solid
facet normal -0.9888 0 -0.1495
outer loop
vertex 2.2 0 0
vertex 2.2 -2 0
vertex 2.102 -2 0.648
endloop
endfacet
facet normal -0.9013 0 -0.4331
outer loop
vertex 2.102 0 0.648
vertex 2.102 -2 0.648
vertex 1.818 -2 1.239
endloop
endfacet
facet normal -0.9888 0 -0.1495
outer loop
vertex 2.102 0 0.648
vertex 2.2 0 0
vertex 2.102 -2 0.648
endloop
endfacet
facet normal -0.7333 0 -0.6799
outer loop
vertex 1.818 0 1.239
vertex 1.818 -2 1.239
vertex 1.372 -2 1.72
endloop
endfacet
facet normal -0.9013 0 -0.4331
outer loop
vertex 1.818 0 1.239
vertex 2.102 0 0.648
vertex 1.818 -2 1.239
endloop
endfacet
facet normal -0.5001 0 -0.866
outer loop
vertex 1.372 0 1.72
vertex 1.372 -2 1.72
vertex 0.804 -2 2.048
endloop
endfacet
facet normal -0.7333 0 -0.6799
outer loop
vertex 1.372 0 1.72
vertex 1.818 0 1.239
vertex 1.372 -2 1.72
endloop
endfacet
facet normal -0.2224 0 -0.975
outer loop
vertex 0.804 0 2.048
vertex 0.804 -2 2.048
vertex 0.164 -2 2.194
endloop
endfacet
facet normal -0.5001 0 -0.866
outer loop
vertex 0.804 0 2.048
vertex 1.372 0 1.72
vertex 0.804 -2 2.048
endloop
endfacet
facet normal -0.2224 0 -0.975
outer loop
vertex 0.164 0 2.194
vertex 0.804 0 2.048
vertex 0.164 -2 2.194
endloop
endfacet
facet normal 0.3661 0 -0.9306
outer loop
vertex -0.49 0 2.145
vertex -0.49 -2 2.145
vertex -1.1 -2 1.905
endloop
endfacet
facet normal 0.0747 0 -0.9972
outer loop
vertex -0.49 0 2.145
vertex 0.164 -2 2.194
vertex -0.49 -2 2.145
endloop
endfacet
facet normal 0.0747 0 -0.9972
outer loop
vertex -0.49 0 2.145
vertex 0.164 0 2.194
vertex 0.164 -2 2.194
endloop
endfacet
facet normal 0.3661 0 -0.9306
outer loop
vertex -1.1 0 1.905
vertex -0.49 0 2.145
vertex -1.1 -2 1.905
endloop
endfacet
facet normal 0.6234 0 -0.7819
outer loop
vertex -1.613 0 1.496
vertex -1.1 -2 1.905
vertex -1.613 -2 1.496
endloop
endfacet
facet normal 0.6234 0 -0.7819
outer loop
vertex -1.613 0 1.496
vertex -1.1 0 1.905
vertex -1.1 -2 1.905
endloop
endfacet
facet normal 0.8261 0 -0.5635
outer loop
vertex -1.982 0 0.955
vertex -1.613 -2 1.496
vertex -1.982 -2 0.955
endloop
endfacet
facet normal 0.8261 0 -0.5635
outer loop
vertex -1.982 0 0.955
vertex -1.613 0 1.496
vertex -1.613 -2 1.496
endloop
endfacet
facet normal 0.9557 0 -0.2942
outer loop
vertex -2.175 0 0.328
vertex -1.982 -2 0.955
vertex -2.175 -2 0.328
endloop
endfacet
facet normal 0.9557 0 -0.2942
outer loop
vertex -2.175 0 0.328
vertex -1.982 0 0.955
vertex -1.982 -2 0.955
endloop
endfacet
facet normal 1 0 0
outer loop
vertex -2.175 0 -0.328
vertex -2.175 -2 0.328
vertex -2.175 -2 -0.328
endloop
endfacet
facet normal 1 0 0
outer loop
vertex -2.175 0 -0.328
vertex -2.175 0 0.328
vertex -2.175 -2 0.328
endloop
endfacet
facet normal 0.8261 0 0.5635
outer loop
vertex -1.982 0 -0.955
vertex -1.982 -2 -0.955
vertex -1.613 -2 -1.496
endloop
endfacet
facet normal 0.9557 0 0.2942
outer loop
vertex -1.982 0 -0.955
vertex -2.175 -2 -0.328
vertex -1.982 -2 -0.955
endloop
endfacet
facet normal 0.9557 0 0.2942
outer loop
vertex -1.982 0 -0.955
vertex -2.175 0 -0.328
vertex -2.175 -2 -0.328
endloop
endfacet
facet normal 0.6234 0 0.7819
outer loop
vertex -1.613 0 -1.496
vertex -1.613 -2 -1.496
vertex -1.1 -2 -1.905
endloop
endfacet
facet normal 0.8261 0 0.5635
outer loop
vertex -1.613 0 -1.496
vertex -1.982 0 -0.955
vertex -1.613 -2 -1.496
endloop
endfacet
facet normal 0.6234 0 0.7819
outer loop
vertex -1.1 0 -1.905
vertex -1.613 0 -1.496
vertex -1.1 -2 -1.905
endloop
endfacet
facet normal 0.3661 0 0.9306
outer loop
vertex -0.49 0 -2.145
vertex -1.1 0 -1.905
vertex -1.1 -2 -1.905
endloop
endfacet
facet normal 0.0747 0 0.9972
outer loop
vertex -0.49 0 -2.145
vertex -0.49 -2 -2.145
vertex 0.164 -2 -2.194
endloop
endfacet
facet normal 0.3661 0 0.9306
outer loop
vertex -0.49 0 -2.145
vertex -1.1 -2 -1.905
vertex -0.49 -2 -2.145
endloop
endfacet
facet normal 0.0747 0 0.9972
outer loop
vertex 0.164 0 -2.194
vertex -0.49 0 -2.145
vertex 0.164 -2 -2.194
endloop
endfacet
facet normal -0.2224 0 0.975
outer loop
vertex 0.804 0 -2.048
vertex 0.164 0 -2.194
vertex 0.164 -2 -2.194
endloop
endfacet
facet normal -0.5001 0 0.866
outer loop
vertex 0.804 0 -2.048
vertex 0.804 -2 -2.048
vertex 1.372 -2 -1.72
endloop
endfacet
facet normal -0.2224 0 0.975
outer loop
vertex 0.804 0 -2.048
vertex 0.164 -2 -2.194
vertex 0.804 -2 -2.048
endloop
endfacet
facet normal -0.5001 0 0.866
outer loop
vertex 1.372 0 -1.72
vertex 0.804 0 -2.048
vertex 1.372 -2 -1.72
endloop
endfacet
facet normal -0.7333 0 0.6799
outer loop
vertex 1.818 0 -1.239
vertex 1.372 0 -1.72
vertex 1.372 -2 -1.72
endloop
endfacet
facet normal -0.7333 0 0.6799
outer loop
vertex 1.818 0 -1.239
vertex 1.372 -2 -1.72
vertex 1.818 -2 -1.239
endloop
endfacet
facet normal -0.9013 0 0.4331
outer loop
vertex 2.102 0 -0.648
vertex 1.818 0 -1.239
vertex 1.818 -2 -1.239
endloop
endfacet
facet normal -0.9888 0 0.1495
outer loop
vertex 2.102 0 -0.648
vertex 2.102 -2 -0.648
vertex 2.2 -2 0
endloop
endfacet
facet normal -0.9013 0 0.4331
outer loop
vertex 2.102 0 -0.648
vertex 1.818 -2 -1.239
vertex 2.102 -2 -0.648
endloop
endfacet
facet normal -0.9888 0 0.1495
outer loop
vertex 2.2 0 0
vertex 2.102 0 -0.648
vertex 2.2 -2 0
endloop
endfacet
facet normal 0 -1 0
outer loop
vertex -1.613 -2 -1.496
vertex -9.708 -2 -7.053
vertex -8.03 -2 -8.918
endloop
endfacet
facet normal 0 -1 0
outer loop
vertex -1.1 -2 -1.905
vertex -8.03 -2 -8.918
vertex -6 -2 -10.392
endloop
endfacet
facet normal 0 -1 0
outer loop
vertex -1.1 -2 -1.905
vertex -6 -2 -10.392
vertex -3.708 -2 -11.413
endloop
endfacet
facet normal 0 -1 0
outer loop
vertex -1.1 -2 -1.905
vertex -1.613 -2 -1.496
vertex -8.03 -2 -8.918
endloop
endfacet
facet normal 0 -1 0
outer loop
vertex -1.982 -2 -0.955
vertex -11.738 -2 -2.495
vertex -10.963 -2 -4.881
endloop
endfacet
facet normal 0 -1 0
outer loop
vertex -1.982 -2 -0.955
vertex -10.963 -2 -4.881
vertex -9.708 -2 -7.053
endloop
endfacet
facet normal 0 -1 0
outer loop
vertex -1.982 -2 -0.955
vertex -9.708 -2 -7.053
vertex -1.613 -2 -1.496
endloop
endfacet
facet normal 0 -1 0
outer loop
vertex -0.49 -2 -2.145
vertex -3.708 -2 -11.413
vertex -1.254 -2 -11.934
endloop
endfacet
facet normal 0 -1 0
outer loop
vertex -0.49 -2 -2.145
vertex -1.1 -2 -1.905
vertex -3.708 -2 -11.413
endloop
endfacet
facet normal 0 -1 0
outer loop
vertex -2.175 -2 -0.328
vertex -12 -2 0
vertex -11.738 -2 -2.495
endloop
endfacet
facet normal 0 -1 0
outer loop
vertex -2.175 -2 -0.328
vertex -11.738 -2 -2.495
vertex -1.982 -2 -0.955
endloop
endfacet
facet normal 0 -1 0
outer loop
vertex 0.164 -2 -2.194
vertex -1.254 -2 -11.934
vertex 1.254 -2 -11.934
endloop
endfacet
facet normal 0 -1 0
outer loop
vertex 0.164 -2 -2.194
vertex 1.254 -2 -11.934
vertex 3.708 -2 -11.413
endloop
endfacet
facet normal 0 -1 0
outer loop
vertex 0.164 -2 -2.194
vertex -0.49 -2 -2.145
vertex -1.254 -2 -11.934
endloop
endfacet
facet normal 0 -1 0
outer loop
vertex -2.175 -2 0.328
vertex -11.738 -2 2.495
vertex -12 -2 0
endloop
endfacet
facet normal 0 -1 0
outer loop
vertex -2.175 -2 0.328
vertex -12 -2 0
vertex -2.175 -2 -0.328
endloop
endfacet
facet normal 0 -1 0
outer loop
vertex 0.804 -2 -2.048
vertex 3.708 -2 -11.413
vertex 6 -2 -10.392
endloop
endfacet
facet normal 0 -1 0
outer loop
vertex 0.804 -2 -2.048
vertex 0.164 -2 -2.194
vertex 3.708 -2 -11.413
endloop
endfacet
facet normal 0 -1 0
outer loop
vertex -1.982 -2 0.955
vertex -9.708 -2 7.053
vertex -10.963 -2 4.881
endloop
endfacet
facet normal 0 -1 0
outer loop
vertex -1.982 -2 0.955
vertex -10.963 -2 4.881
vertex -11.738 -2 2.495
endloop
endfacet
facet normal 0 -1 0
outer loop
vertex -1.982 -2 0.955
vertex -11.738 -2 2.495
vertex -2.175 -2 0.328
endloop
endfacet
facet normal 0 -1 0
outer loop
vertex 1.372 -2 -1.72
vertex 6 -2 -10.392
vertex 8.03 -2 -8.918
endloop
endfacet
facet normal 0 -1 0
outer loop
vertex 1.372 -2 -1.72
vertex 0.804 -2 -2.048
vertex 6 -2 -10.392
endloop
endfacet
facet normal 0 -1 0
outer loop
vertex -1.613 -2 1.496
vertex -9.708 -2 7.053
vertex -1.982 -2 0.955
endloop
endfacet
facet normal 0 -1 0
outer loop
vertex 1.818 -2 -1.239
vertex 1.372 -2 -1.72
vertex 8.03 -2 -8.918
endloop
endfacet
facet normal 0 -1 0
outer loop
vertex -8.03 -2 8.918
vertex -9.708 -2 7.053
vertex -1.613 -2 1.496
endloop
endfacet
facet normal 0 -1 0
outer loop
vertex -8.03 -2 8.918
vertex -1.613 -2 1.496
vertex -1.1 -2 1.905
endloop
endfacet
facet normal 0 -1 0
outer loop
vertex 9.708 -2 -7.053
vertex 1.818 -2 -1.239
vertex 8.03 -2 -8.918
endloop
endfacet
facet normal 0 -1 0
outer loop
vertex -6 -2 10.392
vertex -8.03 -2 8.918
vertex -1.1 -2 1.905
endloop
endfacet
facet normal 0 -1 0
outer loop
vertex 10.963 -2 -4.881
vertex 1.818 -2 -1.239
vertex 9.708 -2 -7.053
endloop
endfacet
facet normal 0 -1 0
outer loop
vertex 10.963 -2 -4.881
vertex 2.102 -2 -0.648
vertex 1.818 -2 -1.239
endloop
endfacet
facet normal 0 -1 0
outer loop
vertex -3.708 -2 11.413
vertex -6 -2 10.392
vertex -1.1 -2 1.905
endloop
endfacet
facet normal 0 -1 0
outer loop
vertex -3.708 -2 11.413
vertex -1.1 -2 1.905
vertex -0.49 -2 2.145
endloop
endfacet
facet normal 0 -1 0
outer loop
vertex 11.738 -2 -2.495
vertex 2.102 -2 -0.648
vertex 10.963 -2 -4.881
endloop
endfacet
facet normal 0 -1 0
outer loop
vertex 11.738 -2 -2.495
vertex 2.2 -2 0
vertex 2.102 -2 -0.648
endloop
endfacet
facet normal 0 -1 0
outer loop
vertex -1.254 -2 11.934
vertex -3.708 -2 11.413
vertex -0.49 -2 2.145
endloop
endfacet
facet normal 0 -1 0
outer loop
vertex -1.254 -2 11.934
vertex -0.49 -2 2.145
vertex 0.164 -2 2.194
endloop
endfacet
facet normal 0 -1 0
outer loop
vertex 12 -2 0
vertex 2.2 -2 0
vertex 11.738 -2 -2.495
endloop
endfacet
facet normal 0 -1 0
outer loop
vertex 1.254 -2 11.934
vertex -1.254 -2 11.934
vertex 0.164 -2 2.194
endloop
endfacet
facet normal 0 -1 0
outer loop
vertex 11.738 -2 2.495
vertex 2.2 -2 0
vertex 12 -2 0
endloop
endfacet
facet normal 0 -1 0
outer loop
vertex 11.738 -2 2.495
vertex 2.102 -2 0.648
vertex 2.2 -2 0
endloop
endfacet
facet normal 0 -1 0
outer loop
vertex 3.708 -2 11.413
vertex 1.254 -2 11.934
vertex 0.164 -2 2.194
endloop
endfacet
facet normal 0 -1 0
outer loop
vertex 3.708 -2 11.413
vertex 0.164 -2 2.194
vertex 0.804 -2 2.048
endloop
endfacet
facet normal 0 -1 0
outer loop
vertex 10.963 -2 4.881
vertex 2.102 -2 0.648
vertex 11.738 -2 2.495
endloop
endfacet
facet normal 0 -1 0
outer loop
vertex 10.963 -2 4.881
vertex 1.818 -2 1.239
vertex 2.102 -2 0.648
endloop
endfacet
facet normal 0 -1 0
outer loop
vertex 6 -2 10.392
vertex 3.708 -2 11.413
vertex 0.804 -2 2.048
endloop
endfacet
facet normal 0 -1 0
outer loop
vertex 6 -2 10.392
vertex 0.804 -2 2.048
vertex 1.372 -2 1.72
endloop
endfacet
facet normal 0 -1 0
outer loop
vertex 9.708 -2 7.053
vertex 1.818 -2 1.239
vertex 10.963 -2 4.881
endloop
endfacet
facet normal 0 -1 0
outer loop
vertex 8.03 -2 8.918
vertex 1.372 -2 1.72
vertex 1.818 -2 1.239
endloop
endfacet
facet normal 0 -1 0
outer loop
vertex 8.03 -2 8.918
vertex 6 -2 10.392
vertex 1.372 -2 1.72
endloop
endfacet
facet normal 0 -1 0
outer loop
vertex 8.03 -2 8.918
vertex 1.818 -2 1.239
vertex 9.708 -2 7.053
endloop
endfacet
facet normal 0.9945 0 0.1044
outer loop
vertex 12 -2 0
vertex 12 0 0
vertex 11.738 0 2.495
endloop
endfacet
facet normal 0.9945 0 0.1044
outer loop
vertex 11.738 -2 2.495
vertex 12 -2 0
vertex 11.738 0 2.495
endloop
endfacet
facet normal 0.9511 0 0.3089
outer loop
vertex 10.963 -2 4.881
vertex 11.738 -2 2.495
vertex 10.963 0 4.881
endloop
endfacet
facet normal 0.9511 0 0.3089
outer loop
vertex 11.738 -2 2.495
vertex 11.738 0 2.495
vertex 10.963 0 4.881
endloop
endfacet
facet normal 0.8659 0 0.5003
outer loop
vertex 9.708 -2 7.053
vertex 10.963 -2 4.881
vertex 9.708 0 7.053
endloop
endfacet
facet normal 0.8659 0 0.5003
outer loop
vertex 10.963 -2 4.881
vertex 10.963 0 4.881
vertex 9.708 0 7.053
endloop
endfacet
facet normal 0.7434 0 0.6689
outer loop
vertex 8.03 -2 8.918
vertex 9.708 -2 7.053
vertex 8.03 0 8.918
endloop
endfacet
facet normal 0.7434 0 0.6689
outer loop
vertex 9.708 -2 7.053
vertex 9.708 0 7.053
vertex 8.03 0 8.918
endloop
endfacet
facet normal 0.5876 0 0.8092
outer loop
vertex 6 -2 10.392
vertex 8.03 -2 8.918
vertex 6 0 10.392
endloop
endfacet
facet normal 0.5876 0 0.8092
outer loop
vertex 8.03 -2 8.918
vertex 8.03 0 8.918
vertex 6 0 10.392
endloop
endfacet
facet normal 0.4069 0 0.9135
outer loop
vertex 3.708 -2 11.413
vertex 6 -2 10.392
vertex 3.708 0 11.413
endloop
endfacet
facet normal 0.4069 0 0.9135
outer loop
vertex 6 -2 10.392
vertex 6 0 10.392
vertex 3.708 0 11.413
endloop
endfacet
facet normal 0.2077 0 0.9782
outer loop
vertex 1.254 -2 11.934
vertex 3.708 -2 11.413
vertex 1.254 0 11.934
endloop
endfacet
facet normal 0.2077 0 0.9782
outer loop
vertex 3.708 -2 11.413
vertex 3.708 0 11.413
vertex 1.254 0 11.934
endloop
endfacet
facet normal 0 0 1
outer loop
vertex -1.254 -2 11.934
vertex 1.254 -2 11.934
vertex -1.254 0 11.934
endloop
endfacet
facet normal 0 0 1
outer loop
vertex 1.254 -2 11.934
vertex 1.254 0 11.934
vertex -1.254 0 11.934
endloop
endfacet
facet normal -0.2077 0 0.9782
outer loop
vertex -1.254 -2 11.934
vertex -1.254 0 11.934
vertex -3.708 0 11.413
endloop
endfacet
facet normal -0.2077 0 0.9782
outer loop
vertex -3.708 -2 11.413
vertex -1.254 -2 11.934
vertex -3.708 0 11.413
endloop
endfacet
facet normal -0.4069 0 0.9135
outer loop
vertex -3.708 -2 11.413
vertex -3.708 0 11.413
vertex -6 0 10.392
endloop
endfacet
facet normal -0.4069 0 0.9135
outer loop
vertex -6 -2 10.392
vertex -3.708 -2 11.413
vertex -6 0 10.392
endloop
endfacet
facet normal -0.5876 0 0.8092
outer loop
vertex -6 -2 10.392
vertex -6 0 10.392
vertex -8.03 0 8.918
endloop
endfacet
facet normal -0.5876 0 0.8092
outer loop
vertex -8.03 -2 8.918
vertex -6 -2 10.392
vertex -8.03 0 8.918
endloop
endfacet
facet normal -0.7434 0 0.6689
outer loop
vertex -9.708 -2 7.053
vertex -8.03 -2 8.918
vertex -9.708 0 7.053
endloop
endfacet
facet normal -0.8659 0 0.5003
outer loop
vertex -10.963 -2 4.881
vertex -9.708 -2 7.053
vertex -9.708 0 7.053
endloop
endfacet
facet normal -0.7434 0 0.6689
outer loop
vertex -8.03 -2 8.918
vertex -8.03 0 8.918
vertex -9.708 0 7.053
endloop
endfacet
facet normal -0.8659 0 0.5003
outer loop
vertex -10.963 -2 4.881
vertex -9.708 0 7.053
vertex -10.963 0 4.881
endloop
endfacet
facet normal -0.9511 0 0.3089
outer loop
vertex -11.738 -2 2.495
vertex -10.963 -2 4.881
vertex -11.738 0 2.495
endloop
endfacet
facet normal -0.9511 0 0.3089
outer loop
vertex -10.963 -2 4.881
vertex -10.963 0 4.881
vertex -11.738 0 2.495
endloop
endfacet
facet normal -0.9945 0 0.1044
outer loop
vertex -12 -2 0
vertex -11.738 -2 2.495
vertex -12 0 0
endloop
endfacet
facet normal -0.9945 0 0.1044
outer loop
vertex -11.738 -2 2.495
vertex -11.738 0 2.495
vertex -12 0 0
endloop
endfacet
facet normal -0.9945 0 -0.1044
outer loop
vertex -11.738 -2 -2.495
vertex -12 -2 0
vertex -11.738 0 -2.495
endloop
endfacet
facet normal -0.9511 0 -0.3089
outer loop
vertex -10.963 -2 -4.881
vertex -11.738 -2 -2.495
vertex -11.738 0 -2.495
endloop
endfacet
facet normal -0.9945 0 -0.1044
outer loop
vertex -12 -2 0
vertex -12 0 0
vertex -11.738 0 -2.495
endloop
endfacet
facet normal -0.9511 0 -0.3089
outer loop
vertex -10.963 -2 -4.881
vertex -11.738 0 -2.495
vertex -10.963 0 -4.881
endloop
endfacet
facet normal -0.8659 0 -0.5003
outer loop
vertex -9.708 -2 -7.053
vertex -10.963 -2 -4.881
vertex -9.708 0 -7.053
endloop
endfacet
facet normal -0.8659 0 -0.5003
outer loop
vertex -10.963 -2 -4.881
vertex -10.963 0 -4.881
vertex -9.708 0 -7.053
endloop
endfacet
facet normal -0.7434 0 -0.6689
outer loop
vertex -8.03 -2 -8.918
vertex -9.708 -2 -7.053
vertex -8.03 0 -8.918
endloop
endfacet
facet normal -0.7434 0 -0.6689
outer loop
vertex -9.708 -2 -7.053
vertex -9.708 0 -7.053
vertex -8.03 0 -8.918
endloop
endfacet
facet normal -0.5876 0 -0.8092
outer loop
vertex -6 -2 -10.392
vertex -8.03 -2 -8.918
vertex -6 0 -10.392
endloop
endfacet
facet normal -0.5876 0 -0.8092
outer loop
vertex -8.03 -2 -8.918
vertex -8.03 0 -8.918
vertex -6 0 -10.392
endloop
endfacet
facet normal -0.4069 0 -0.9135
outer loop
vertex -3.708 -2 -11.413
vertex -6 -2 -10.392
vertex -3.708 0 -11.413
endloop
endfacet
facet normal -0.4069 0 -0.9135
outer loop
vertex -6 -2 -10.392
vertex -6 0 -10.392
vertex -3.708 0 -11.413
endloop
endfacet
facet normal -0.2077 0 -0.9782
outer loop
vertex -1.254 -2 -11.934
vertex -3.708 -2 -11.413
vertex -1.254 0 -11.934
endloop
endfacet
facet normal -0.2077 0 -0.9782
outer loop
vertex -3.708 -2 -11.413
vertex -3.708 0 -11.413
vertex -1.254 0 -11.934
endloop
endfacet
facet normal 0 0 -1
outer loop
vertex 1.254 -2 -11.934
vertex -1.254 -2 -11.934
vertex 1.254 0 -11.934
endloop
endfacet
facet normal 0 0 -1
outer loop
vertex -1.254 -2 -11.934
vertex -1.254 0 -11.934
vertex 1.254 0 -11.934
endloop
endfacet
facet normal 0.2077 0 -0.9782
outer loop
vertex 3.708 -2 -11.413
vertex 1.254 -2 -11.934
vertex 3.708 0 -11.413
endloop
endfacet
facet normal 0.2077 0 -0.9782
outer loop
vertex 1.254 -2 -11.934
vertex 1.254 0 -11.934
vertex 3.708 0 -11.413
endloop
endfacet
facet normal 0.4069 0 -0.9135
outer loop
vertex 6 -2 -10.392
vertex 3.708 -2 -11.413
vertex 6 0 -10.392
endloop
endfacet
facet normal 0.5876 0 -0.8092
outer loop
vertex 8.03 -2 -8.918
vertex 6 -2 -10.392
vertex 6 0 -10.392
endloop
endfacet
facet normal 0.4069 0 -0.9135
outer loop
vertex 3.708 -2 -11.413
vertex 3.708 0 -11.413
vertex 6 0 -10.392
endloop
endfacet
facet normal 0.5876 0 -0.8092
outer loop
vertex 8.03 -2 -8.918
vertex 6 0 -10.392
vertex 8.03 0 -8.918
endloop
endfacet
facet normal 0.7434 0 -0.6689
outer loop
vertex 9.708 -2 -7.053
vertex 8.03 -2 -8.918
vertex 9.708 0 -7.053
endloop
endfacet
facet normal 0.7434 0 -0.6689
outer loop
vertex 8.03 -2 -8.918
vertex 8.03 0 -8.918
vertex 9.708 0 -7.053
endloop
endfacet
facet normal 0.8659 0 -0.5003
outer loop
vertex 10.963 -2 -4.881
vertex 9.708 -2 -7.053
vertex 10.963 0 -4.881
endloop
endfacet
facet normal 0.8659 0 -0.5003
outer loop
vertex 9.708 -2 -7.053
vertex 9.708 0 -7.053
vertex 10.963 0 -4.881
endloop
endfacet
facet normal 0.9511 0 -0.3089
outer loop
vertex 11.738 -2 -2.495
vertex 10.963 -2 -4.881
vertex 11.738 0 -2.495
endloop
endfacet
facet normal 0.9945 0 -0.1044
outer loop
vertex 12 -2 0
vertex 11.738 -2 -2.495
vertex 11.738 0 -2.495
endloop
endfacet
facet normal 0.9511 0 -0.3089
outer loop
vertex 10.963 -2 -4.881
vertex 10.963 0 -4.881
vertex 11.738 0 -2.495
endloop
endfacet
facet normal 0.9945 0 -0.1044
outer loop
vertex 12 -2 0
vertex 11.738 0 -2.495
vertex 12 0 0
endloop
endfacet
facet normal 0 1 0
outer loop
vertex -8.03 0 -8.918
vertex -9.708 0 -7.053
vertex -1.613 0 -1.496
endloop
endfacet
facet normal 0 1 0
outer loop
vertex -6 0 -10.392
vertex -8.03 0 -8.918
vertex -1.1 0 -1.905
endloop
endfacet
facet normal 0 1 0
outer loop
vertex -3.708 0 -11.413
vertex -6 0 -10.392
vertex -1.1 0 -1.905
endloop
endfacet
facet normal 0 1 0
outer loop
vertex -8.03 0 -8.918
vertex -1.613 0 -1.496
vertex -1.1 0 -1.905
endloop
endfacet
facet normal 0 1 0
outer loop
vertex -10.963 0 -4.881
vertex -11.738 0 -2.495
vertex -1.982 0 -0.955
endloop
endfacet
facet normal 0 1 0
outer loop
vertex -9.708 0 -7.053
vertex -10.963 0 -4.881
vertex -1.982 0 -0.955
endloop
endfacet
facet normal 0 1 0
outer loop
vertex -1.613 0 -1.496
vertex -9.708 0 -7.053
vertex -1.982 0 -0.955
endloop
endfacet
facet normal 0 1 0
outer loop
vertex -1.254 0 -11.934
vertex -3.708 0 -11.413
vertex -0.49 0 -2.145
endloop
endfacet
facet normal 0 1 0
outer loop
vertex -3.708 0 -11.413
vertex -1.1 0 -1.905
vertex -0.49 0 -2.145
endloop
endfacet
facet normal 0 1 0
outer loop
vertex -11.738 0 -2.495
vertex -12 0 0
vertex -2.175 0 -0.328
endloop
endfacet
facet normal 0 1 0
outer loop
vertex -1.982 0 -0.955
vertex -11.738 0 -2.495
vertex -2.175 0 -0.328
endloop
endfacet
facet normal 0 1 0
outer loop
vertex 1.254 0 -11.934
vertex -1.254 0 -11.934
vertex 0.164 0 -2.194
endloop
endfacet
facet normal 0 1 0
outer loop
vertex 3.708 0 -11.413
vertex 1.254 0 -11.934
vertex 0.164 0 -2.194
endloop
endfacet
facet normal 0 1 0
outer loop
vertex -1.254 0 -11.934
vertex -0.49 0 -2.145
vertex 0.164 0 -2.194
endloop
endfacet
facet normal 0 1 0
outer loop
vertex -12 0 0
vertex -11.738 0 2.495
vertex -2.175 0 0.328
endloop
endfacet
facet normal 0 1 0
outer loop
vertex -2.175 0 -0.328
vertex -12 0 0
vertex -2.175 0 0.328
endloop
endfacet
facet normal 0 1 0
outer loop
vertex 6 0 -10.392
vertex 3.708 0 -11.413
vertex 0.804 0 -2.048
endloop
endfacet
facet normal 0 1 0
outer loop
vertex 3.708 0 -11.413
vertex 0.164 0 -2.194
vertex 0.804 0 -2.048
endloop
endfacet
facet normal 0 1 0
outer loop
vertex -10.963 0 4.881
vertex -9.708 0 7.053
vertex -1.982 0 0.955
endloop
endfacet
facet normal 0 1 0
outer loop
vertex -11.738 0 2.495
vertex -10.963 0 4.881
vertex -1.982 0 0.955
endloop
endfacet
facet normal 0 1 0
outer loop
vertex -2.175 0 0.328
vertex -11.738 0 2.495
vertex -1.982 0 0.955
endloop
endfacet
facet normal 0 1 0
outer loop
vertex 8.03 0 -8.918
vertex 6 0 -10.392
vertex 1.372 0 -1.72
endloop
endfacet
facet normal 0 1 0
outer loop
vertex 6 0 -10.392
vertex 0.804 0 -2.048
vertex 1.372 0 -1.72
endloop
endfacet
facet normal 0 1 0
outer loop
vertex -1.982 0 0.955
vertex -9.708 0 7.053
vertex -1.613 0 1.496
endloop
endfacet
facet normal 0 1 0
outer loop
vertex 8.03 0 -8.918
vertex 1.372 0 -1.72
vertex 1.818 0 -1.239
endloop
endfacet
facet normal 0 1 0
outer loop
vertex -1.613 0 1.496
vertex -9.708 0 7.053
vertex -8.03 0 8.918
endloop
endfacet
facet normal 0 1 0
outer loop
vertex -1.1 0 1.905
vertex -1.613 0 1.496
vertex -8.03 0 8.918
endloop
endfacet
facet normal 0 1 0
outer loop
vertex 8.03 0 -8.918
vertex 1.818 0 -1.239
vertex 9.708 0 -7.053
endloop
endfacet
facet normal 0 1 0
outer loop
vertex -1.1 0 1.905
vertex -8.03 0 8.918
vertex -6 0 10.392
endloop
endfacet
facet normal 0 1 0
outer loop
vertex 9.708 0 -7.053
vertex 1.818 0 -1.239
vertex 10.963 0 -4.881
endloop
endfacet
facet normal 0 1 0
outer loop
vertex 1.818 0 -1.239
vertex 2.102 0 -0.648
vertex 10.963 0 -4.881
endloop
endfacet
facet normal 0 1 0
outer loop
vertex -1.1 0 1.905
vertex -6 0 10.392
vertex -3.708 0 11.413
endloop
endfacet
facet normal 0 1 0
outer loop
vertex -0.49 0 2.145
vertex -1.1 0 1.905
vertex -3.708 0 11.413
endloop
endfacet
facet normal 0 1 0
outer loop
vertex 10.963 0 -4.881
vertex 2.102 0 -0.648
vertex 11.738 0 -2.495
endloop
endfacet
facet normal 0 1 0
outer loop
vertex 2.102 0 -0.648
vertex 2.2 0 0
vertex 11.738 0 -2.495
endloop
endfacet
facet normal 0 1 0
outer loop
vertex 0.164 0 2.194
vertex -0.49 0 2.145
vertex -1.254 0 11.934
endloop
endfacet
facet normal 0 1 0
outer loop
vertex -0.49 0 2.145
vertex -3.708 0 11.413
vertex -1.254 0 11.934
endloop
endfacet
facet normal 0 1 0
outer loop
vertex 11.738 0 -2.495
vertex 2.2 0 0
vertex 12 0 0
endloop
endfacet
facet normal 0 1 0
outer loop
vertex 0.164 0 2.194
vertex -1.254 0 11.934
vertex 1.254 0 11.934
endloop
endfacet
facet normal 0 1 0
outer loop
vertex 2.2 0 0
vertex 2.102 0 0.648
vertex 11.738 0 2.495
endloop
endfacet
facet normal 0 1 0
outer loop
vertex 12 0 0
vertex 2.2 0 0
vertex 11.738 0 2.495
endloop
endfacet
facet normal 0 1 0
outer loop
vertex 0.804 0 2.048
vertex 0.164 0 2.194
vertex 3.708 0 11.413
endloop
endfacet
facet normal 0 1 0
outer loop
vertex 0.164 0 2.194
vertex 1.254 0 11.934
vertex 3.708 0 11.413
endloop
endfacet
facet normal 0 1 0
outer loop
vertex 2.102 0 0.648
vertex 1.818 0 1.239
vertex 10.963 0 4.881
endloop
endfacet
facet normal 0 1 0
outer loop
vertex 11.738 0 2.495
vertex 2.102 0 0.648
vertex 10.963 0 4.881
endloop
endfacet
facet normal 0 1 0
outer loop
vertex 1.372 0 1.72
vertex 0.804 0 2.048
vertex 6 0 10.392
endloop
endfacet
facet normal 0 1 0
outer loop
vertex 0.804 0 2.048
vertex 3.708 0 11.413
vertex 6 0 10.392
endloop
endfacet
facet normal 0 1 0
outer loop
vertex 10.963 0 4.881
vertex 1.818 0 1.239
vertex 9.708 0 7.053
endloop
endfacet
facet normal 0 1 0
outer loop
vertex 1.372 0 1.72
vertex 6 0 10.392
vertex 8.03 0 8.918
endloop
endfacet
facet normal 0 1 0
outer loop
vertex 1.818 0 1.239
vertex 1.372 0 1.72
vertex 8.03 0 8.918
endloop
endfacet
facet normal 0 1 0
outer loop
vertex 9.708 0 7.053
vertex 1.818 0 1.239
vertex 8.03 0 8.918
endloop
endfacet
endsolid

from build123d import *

# Parameters (mm, degrees)
CYLINDER011007_R     = 2.2
CYLINDER011007_DEPTH = 20
CYLINDER011008_R     = 12
CYLINDER011008_DEPTH = 2


with BuildPart() as belt_attach_insert_hole:
    # Cylinder011007 → Cylinder011007 (new body)
    with BuildSketch(Plane.XZ):
        Circle(CYLINDER011007_R)
    extrude(amount=CYLINDER011007_DEPTH)


with BuildPart() as belt_addach_washer_cut:
    # Cylinder011008 → Cylinder011008 (new body)
    with BuildSketch(Plane.XZ):
        Circle(CYLINDER011008_R)
    extrude(amount=CYLINDER011008_DEPTH)

    # Cut023015009008: cut belt attach insert hole
    add(belt_attach_insert_hole.part, mode=Mode.SUBTRACT)


solid = belt_addach_washer_cut.part
